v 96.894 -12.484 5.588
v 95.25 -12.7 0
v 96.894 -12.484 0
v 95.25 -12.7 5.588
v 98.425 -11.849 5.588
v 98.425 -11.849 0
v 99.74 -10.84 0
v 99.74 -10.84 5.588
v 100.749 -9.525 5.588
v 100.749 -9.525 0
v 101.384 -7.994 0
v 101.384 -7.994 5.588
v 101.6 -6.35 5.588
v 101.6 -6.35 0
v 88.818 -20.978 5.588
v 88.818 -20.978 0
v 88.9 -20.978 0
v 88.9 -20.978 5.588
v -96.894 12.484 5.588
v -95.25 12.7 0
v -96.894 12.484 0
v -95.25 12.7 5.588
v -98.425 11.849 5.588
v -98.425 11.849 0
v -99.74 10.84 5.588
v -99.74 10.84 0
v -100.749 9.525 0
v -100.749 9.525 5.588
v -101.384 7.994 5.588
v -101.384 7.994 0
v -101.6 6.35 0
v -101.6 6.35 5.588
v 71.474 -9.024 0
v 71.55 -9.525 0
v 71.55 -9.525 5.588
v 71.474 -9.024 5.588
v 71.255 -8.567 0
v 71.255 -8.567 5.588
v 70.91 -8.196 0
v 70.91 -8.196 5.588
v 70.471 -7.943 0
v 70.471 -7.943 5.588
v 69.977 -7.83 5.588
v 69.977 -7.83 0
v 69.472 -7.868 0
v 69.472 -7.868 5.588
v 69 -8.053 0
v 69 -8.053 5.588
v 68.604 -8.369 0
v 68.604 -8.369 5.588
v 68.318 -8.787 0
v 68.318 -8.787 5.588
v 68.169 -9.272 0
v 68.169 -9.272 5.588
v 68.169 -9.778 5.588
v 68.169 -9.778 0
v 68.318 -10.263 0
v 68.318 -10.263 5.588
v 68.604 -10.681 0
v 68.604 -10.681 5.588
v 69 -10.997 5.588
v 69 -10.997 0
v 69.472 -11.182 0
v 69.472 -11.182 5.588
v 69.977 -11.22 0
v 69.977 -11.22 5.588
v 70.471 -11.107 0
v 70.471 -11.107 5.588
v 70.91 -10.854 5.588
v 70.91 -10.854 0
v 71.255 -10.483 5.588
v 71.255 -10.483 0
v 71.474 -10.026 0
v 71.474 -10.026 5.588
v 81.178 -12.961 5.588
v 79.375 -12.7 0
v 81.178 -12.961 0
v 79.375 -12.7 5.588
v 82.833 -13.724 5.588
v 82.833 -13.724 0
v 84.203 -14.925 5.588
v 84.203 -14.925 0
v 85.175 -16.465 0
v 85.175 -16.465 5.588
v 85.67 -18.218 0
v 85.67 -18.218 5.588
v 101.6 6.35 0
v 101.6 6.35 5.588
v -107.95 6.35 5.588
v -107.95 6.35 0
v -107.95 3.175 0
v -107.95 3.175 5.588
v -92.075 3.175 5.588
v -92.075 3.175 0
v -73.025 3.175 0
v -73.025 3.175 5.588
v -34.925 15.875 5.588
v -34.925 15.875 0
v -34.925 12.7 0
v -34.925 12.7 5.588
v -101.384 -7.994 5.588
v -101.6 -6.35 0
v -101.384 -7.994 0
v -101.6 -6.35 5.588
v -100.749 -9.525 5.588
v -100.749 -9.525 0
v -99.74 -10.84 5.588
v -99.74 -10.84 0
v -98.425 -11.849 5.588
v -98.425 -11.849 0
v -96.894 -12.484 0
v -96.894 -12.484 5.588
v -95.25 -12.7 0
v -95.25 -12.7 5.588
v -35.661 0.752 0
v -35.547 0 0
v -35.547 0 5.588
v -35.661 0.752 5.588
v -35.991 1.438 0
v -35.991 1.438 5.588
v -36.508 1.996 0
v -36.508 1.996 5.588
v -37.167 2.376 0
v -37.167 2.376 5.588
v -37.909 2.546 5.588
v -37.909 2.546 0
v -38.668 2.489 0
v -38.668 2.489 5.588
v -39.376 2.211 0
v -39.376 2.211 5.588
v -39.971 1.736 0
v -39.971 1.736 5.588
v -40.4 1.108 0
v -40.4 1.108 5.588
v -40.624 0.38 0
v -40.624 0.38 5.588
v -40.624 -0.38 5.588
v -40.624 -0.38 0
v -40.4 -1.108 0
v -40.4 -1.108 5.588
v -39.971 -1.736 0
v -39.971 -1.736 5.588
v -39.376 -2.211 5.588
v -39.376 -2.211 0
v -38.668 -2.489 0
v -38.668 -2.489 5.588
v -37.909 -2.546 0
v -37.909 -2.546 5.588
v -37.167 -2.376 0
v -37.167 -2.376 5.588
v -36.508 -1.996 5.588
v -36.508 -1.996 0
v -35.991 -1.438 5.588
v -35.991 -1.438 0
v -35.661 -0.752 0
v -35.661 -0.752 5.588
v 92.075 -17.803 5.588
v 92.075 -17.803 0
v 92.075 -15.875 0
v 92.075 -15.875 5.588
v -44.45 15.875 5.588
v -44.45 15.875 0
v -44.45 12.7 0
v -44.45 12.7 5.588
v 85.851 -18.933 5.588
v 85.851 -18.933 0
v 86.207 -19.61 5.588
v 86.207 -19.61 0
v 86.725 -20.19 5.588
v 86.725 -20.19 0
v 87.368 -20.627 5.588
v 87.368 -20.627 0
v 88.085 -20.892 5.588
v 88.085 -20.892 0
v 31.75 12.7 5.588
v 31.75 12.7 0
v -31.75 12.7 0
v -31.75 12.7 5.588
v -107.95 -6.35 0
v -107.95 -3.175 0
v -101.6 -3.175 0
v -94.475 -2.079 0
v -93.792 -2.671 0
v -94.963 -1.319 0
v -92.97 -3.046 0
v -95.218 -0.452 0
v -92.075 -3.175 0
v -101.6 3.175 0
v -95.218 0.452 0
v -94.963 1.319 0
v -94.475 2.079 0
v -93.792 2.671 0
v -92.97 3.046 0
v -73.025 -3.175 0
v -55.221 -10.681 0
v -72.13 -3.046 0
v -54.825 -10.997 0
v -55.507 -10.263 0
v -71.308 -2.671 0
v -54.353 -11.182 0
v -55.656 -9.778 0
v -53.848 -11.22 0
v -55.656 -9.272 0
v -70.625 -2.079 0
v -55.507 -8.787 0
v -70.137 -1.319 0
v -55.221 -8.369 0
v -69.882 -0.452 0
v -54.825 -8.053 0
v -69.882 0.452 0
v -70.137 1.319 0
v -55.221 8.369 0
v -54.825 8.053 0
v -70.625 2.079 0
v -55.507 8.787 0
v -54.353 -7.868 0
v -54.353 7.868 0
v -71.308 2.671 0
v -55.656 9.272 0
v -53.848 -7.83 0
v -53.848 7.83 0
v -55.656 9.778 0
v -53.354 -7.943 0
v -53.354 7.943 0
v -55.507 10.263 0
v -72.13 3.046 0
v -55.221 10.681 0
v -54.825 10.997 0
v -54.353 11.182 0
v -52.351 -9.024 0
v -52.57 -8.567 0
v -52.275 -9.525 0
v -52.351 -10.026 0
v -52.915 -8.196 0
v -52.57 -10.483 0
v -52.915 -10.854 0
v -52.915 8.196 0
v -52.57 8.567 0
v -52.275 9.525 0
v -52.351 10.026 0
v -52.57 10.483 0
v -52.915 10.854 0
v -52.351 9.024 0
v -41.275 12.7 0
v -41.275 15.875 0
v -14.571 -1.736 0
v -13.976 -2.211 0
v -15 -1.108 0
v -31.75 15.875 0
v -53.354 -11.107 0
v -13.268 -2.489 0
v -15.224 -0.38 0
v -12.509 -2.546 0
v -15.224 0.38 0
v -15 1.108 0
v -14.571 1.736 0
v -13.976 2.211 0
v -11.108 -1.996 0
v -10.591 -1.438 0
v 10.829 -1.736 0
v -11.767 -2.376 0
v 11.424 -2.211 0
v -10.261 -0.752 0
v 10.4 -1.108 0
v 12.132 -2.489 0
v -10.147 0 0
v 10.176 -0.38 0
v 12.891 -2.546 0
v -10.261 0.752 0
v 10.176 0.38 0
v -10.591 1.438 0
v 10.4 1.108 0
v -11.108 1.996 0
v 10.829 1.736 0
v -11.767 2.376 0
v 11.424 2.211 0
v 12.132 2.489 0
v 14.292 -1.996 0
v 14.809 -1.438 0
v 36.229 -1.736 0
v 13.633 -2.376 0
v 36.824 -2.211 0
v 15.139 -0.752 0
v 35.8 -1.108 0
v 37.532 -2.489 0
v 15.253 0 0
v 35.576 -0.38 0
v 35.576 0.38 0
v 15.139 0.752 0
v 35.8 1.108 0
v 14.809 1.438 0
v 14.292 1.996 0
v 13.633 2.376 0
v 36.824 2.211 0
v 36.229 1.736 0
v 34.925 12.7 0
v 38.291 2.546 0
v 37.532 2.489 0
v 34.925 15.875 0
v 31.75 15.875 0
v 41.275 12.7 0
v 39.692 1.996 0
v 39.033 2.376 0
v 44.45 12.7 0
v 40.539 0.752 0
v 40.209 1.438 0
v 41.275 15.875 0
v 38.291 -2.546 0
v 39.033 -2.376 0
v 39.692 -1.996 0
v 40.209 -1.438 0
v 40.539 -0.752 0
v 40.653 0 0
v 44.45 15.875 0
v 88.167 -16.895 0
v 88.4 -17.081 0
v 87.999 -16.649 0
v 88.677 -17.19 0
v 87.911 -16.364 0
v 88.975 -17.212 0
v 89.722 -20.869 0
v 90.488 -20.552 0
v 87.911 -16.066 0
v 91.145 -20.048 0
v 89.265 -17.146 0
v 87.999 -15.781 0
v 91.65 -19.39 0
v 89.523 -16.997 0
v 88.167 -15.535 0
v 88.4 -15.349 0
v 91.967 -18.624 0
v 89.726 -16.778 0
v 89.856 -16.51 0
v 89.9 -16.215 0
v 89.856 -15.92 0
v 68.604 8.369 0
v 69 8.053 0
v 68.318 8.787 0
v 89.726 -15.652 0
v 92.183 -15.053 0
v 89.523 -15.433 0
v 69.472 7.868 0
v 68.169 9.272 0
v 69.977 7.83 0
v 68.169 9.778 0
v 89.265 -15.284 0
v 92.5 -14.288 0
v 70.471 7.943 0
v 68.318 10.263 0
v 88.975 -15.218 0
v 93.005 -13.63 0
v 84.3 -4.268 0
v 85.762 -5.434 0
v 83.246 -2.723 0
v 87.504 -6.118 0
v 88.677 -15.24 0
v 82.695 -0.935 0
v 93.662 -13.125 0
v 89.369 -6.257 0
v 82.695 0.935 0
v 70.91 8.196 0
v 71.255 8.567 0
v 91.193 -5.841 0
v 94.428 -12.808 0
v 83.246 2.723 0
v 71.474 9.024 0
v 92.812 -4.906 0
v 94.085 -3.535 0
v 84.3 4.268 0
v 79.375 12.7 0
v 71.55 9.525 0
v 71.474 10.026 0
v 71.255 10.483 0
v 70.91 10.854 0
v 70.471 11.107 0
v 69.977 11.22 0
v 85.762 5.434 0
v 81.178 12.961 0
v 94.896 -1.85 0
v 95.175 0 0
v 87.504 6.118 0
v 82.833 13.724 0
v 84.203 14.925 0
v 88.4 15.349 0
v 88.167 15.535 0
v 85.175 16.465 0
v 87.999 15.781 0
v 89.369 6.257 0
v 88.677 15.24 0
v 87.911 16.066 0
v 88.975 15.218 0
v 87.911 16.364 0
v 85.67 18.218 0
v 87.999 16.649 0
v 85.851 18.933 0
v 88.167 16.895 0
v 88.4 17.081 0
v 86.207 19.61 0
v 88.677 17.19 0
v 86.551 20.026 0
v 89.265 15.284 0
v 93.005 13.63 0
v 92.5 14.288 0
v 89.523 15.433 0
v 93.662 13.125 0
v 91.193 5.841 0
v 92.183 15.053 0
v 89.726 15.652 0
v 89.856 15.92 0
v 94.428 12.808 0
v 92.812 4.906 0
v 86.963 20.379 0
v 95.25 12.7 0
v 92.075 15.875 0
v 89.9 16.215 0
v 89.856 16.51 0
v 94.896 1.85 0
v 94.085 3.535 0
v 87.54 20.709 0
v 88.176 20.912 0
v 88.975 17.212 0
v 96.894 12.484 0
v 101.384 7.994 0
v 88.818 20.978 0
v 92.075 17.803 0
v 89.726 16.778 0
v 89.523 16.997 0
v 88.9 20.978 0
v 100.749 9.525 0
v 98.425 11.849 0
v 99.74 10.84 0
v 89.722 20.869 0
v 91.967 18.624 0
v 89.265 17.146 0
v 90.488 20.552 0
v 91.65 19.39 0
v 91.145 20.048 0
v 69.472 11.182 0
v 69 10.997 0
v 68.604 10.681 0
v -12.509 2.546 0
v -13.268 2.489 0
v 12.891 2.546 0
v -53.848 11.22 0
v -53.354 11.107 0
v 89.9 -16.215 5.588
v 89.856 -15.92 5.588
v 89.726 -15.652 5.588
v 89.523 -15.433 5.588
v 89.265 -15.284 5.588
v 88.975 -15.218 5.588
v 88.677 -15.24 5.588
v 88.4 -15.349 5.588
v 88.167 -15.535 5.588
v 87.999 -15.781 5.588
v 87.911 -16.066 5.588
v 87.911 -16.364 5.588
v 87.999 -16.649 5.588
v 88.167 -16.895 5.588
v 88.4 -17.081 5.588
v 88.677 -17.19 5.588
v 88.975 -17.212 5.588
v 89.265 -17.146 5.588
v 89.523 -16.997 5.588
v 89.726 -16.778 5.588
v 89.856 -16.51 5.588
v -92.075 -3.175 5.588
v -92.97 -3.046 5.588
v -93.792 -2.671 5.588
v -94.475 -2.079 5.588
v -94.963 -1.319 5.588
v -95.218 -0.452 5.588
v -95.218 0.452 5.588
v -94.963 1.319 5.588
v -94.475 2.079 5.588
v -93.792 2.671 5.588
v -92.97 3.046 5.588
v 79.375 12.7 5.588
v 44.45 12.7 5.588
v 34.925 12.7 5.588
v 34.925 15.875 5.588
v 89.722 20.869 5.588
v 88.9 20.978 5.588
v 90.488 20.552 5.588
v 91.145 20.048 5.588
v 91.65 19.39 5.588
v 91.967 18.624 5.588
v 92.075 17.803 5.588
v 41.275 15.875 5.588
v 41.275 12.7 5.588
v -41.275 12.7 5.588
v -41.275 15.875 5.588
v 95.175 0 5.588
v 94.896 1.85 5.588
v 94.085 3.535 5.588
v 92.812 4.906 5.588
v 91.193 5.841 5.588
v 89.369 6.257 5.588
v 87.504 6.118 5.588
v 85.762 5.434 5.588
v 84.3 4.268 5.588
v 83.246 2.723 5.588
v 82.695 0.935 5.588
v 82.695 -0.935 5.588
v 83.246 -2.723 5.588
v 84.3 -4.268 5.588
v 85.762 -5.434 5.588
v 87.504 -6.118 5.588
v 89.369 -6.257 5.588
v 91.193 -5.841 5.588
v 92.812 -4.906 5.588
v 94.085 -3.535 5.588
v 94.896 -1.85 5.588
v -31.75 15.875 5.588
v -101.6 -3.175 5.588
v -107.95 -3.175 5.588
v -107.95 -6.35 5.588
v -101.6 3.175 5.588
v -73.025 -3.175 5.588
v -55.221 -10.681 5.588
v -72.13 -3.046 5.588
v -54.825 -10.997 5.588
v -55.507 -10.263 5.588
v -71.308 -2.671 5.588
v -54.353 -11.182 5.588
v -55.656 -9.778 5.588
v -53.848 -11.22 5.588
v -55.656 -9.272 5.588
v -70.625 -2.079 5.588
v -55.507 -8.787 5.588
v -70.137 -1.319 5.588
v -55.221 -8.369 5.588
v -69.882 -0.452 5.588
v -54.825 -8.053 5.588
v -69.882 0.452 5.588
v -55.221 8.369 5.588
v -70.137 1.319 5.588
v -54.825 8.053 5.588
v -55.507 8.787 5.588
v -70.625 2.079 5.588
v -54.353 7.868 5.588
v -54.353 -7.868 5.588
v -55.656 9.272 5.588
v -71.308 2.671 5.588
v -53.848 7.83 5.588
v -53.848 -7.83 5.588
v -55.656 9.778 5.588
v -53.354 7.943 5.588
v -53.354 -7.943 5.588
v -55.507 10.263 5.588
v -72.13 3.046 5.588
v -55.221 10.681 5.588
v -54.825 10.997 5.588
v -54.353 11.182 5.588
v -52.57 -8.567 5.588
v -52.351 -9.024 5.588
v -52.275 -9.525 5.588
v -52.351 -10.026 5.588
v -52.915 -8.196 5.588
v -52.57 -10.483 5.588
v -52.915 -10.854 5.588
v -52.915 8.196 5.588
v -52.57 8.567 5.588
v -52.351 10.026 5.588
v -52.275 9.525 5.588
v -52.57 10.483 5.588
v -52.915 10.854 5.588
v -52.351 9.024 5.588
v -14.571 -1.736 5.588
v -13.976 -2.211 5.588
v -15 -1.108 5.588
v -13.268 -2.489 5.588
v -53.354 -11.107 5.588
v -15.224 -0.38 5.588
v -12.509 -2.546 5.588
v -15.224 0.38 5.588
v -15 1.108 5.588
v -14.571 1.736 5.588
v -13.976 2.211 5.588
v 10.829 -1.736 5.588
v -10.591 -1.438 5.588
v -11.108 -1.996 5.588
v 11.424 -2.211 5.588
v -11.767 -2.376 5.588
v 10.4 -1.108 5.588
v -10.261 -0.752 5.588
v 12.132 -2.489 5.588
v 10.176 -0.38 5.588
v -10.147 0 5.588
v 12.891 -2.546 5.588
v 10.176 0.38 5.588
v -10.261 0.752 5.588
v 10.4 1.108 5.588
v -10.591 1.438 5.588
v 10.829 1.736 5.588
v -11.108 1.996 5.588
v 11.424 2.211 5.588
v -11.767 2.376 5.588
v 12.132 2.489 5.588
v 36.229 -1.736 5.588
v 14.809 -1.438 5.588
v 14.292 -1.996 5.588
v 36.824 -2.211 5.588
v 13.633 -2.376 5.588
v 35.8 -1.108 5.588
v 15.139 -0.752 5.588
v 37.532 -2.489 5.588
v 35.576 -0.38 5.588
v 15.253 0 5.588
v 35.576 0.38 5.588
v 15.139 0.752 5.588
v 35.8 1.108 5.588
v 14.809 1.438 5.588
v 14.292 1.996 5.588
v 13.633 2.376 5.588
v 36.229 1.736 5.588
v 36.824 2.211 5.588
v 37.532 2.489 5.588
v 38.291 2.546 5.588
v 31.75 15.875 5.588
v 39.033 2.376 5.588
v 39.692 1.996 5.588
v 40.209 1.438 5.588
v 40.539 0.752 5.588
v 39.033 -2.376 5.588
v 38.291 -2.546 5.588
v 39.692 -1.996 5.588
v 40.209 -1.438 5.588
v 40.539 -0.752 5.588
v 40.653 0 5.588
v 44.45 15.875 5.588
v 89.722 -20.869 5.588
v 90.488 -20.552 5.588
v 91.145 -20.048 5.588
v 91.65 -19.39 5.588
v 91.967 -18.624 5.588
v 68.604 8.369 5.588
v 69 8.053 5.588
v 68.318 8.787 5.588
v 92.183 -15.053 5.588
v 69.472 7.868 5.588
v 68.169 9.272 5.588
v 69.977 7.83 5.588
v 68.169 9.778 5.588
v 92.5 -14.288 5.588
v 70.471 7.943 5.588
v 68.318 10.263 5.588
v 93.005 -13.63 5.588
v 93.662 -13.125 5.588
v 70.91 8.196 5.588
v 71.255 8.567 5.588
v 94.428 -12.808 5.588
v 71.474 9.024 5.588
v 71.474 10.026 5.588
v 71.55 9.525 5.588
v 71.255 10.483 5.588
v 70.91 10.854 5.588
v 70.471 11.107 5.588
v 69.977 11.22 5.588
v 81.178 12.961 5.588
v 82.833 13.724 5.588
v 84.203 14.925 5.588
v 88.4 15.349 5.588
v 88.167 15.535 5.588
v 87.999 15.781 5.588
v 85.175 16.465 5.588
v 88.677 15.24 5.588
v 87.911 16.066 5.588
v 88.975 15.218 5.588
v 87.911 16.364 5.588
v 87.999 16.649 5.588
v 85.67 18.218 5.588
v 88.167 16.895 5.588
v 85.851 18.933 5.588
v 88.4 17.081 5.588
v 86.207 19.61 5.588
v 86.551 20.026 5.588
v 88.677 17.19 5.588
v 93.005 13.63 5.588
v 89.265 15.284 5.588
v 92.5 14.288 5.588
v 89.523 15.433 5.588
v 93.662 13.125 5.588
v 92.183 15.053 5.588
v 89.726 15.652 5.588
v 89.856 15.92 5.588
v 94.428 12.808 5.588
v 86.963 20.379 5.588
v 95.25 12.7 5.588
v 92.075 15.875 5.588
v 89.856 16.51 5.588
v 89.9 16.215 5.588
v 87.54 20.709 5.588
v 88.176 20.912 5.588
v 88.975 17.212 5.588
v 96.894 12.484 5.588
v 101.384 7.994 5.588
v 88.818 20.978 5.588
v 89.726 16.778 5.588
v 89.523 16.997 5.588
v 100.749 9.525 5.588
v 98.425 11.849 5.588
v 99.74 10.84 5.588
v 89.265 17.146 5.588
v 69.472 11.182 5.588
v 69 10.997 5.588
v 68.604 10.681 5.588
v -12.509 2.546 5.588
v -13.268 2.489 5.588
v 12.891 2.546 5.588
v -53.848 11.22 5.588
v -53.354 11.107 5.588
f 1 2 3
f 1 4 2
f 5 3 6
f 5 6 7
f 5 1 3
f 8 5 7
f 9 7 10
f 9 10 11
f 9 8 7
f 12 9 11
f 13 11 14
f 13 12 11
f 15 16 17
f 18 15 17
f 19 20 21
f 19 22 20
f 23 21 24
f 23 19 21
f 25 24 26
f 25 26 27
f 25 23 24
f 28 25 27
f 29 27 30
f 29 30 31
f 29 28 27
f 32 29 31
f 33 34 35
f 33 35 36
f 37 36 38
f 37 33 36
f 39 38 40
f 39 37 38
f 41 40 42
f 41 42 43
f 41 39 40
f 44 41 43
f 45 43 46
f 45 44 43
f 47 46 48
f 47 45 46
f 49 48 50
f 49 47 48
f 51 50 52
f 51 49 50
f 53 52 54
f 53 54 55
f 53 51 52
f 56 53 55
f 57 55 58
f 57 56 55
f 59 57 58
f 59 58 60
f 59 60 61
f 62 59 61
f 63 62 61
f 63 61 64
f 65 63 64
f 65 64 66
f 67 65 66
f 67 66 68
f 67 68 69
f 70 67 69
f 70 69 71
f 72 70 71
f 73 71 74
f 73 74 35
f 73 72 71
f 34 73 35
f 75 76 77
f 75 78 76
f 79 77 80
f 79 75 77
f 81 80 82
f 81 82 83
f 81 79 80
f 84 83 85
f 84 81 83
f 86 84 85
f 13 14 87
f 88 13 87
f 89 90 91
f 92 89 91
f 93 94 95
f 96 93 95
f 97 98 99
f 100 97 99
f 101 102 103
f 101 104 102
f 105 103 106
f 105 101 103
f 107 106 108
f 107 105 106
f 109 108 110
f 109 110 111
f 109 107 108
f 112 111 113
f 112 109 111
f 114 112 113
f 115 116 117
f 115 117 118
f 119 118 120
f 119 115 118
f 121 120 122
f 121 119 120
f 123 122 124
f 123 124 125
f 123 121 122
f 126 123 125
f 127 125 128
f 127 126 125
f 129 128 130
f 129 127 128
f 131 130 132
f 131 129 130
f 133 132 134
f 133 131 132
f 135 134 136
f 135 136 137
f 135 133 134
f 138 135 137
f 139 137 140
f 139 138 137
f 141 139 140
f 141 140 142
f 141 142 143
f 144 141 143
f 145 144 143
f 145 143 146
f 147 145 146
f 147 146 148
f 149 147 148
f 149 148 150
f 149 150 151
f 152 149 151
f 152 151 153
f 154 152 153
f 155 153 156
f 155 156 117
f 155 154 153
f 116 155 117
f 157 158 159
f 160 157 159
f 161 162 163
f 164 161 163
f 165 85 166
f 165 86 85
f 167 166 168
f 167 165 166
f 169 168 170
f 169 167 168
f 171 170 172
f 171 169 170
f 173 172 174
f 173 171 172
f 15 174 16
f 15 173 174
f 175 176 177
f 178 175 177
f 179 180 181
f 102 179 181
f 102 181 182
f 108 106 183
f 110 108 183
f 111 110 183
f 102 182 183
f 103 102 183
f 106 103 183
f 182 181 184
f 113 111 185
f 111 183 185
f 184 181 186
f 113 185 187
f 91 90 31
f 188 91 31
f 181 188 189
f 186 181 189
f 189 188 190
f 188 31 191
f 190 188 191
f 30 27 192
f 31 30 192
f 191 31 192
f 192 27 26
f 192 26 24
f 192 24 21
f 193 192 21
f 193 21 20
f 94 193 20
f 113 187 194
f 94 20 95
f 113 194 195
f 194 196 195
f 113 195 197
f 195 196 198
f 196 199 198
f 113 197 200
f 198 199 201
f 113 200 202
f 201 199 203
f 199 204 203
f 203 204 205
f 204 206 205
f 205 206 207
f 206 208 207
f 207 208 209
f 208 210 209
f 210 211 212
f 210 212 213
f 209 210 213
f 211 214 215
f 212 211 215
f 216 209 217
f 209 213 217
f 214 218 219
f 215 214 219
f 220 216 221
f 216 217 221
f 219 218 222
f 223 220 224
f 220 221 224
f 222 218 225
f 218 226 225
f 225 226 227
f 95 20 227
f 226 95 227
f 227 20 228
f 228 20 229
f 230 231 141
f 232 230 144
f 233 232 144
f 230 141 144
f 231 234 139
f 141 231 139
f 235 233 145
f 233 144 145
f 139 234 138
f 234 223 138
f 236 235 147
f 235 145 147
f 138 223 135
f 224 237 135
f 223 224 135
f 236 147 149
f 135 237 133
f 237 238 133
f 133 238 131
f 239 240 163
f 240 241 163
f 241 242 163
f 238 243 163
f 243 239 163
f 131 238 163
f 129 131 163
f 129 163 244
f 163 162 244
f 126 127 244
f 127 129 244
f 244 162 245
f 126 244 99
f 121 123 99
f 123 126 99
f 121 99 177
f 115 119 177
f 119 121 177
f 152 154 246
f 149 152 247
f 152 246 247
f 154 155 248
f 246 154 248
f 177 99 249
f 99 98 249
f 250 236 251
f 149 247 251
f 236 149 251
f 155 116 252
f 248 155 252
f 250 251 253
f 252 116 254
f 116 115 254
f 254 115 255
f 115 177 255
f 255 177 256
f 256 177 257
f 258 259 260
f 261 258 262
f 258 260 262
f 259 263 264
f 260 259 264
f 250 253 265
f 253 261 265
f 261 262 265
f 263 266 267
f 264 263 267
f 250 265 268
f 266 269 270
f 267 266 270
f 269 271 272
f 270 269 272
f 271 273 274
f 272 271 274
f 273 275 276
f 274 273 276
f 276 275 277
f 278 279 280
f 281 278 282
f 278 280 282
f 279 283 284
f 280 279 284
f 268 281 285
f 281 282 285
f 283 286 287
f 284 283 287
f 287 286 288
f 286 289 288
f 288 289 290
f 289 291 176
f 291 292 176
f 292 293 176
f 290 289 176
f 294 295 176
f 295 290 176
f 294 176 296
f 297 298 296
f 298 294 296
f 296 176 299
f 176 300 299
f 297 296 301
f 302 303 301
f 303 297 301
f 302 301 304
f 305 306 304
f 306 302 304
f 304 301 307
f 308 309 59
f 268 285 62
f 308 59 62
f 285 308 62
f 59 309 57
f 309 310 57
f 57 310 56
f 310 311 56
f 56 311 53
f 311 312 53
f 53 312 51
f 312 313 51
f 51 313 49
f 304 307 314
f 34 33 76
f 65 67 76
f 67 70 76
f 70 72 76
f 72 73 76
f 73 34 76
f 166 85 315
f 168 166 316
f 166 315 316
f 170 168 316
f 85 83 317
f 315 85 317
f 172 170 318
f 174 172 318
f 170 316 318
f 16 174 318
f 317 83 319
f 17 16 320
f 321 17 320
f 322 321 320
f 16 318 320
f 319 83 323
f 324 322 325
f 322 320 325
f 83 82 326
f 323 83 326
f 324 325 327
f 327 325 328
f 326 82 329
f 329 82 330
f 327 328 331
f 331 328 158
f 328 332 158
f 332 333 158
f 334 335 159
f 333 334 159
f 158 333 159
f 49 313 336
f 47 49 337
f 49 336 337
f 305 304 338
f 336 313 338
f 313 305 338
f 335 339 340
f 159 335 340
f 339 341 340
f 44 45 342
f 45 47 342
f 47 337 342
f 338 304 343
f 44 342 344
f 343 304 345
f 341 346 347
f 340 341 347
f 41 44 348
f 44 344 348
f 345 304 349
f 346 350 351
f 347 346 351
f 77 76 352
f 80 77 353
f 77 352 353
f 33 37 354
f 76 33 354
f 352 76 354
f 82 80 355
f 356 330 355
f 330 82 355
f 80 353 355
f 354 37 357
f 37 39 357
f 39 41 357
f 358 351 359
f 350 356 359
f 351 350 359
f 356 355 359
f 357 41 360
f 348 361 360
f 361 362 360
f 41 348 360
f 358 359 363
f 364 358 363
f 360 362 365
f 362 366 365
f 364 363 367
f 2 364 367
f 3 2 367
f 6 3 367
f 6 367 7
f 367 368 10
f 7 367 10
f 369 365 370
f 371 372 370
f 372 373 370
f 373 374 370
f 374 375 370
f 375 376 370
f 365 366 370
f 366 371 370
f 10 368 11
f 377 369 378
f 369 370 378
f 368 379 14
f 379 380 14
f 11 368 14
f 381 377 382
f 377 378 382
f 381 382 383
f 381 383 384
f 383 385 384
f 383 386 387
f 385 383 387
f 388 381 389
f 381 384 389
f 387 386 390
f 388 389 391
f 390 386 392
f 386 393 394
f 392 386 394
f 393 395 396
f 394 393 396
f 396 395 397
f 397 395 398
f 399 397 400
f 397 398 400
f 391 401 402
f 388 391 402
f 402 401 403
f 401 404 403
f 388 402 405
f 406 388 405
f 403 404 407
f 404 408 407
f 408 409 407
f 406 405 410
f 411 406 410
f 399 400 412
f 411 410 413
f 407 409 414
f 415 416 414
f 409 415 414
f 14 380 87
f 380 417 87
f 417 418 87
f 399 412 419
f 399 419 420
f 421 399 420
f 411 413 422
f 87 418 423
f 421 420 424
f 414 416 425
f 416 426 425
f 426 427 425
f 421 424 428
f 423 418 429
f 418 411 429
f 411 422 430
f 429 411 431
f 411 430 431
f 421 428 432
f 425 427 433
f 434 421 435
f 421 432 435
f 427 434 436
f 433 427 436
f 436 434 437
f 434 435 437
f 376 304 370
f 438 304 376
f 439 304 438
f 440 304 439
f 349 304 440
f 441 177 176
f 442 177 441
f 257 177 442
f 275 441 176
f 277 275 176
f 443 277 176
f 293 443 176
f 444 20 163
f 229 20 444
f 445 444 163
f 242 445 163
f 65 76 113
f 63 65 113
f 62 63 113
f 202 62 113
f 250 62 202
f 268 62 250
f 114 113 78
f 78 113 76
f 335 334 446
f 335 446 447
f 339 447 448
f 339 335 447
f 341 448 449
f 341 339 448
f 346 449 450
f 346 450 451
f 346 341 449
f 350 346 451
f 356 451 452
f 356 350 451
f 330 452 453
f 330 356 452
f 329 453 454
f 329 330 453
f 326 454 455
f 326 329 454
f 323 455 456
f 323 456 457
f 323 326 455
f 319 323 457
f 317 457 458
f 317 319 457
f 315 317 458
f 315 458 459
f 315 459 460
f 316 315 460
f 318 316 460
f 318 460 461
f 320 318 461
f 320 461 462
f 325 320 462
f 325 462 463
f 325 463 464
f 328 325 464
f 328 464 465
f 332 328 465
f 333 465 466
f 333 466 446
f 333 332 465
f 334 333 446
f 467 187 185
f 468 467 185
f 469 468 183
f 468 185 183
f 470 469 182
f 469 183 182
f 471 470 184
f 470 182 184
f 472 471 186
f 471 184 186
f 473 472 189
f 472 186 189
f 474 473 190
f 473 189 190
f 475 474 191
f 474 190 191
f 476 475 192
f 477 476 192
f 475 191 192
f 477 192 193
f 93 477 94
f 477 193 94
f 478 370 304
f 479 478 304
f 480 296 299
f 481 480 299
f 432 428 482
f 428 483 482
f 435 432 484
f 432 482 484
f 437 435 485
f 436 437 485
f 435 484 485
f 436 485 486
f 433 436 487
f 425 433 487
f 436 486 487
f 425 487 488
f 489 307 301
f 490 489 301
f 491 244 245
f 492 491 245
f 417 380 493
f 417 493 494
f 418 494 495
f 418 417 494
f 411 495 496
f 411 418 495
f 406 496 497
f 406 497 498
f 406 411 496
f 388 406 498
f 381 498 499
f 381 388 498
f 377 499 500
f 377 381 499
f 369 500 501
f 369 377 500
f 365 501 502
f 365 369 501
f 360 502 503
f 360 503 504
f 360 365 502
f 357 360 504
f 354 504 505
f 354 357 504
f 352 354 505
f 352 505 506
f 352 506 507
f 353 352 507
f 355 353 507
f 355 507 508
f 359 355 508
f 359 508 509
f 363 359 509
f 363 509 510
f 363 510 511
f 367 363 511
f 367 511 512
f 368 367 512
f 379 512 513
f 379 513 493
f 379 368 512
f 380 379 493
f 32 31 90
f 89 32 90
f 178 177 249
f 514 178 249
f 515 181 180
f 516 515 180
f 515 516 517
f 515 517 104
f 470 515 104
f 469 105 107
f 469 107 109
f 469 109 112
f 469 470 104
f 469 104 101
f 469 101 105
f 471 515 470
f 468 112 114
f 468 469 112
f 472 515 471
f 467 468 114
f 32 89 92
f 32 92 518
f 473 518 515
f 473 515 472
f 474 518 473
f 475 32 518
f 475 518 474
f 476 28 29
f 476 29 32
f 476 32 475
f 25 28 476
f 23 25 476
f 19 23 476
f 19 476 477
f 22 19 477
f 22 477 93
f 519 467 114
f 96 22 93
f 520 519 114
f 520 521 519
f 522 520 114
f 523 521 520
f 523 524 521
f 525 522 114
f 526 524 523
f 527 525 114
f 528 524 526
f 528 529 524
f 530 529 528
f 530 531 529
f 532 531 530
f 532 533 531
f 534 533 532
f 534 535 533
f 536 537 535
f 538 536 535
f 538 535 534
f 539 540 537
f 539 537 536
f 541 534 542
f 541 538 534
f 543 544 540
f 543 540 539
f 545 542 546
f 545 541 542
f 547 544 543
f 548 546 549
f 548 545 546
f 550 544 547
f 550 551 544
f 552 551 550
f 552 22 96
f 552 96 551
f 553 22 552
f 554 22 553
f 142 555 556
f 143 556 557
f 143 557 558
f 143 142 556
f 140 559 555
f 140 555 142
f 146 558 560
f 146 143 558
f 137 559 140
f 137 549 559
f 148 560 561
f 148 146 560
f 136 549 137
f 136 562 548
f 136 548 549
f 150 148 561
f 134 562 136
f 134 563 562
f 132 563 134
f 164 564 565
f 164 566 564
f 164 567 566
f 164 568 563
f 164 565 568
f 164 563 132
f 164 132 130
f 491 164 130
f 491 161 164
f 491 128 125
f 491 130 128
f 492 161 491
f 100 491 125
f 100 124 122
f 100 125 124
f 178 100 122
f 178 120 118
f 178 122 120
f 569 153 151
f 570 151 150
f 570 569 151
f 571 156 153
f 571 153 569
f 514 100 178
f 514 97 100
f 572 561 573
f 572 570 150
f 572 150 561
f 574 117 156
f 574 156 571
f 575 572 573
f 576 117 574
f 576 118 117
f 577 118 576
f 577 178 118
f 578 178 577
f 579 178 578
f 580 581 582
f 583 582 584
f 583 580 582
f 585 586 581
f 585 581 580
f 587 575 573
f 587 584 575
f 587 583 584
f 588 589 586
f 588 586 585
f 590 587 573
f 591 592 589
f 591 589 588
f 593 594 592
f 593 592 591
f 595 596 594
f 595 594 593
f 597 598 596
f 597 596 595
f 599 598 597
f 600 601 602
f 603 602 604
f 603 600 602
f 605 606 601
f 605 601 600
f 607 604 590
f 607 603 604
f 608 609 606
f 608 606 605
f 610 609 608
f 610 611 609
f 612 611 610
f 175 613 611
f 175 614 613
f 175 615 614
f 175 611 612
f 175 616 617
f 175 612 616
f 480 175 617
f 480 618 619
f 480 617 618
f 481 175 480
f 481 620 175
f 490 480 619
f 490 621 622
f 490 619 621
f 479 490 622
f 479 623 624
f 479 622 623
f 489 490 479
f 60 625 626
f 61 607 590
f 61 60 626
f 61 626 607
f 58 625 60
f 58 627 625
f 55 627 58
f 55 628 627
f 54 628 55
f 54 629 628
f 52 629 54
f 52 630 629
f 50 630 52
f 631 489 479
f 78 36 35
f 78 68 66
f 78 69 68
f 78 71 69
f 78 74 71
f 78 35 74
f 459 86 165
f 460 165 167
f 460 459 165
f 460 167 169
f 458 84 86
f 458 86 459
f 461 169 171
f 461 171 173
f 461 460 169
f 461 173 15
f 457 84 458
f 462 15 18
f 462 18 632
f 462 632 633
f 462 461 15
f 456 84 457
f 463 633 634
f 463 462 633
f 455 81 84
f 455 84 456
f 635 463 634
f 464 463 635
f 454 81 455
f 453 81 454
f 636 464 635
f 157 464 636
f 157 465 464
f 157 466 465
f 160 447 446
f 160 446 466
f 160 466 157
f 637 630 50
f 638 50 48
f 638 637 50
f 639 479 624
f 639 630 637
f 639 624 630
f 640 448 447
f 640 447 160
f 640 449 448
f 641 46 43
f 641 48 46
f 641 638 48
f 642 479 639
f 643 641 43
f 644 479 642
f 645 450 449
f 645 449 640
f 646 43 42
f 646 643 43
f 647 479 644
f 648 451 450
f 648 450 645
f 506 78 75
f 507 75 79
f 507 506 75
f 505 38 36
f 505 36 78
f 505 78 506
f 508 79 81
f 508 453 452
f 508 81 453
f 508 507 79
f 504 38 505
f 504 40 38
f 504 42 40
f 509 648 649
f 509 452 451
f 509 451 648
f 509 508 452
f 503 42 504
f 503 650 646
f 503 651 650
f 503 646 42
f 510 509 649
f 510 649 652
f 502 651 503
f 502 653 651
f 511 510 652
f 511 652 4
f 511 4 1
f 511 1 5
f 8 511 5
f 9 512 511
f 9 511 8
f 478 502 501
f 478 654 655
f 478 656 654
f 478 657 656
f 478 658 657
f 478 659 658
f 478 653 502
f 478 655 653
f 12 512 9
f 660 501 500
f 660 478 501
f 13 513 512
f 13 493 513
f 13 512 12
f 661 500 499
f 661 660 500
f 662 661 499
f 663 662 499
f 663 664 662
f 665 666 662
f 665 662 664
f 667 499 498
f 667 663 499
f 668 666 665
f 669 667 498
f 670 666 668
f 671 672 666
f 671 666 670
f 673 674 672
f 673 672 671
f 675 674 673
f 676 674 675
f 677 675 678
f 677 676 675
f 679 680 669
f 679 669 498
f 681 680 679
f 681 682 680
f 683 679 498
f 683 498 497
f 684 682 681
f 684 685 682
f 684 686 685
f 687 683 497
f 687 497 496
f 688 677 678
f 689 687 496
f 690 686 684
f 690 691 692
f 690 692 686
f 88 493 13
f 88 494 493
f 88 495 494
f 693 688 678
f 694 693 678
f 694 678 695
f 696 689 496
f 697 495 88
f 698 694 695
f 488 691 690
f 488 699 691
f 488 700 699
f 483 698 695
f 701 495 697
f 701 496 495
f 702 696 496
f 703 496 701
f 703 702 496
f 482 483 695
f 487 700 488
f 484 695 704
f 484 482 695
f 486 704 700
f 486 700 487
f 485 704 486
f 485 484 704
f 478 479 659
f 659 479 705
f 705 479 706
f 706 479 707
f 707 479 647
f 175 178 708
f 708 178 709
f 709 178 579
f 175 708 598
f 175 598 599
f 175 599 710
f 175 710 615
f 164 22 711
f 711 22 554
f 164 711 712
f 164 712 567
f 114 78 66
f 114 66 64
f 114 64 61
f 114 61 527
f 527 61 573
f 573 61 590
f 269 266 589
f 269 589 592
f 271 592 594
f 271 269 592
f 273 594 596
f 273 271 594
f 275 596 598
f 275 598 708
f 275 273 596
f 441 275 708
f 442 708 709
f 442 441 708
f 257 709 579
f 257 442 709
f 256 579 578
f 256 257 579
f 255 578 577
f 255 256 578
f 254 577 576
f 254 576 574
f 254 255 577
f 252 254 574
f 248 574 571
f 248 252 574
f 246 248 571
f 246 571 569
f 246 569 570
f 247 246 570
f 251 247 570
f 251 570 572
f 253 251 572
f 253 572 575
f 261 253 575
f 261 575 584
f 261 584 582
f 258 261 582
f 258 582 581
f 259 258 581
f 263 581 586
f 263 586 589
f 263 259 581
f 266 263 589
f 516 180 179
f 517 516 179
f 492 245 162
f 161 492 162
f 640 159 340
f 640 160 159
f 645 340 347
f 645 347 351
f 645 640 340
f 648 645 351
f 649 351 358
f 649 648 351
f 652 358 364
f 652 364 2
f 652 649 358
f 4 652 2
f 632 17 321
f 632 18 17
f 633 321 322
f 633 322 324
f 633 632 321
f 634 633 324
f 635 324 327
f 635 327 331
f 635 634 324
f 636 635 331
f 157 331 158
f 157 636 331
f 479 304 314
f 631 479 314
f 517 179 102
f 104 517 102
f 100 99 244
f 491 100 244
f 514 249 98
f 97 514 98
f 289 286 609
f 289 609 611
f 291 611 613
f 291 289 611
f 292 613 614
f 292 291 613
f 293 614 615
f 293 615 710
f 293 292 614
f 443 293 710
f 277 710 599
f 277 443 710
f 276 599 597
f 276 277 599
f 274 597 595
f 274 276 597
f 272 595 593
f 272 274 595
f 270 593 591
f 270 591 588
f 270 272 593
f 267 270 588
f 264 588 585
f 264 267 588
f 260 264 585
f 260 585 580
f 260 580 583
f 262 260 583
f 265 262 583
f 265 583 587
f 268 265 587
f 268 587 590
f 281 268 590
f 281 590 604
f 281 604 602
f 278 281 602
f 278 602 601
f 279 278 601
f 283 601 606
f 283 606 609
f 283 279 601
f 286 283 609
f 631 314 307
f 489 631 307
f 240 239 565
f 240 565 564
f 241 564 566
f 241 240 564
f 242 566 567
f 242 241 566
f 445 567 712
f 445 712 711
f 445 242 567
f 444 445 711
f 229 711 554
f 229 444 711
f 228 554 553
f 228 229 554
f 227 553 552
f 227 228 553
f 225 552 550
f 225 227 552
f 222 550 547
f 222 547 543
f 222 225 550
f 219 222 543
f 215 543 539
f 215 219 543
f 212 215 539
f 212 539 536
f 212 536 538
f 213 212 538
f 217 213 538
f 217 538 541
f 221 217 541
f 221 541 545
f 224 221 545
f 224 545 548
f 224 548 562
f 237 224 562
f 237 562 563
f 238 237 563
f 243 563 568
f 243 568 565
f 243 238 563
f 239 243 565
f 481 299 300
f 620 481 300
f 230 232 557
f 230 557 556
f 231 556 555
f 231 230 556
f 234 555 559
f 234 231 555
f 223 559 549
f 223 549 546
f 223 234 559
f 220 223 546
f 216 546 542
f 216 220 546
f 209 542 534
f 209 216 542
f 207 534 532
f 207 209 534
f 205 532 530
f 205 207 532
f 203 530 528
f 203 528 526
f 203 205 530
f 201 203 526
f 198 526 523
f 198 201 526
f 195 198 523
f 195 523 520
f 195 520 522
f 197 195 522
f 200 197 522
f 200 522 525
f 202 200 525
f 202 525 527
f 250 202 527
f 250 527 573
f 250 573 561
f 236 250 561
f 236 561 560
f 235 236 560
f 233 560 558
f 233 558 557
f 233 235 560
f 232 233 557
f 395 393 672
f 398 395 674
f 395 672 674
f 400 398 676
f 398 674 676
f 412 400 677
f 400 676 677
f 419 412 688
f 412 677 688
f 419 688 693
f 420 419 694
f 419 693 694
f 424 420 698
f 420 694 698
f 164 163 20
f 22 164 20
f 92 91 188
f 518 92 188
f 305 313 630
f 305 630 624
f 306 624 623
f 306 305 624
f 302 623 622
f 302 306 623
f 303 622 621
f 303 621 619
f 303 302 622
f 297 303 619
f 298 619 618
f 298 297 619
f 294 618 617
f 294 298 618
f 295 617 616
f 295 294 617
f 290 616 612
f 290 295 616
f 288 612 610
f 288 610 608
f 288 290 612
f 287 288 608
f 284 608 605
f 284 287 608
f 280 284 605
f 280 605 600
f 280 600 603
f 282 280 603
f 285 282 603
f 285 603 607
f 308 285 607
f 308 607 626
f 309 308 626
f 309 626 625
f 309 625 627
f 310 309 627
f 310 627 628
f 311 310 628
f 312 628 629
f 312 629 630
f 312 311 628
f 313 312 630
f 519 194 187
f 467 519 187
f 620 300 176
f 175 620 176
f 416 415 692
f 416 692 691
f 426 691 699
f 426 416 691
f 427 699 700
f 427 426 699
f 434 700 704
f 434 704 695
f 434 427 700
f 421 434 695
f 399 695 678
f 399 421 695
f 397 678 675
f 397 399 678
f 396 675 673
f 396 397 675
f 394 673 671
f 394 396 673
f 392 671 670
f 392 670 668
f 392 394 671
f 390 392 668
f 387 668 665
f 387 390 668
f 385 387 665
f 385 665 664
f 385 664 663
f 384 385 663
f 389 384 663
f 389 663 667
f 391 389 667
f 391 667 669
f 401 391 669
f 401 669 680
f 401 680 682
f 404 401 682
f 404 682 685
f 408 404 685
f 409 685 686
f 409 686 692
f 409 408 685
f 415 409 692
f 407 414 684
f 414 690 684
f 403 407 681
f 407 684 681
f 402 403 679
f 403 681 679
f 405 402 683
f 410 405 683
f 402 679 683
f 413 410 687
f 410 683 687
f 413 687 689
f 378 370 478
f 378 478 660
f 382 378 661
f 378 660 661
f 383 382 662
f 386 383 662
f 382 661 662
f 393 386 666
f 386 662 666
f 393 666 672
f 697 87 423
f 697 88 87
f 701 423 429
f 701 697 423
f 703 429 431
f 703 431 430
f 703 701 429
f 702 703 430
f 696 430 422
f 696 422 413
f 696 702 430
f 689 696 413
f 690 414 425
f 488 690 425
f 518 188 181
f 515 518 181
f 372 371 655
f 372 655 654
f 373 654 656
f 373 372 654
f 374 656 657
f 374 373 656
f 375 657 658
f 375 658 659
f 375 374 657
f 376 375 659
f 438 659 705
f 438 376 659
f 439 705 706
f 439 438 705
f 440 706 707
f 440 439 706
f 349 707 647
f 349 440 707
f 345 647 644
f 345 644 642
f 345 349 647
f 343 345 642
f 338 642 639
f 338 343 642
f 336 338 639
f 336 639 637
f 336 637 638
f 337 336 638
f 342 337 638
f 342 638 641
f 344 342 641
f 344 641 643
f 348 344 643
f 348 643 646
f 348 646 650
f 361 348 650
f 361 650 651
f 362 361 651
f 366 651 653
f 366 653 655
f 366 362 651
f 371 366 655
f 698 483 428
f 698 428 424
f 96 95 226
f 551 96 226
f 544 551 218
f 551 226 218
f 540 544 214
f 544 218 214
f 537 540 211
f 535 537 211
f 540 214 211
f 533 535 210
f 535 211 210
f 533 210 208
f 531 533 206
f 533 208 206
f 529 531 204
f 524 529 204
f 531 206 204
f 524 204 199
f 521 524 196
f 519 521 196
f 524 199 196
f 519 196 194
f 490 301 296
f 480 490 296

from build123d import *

# Parameters (mm, degrees)
SKETCH2_R           = 1.7
SKETCH2_R_2         = 2.5527
SKETCH2_R_3         = 1
SKETCH2_R_4         = 6.275
BOSS_EXTRUDE1_DEPTH = 5.588
FILLET1_R           = 6.35
FILLET2_R           = 3.175


with BuildPart() as part:
    # Sketch2 → Boss-Extrude1 (new body)
    with BuildSketch(Plane.XY):
        Polygon((-44.45, 12.7), (-101.6, 12.7), (-101.6, 6.35), (-107.95, 6.35), (-107.95, 3.175), (-101.6, 3.175), (-101.6, -3.175), (-107.95, -3.175), (-107.95, -6.35), (-101.6, -6.35), (-101.6, -12.7), (85.725, -12.7), (85.725, -20.9775), (92.075, -20.9775), (92.075, -12.7), (101.6, -12.7), (101.6, 12.7), (92.075, 12.7), (92.075, 20.9775), (85.725, 20.9775), (85.725, 12.7), (44.45, 12.7), (44.45, 15.875), (41.275, 15.875), (41.275, 12.7), (34.925, 12.7), (34.925, 15.875), (31.75, 15.875), (31.75, 12.7), (-31.75, 12.7), (-31.75, 15.875), (-34.925, 15.875), (-34.925, 12.7), (-41.275, 12.7), (-41.275, 15.875), (-44.45, 15.875), align=None)
        with BuildLine():
            ThreePointArc((-92.075, -3.175), (-95.25, 0), (-92.075, 3.175))
            Line((-92.075, 3.175), (-73.025, 3.175))
            ThreePointArc((-73.025, 3.175), (-69.85, 0), (-73.025, -3.175))
            Line((-73.025, -3.175), (-92.075, -3.175))
        make_face(mode=Mode.SUBTRACT)
        with Locations((-53.975, -9.525)):
            Circle(SKETCH2_R, mode=Mode.SUBTRACT)
        with Locations((-38.1, 0)):
            Circle(SKETCH2_R_2, mode=Mode.SUBTRACT)
        with Locations((-12.7, 0)):
            Circle(SKETCH2_R_2, mode=Mode.SUBTRACT)
        with Locations((88.9, -16.215)):
            Circle(SKETCH2_R_3, mode=Mode.SUBTRACT)
        with Locations((12.7, 0)):
            Circle(SKETCH2_R_2, mode=Mode.SUBTRACT)
        with Locations((38.1, 0)):
            Circle(SKETCH2_R_2, mode=Mode.SUBTRACT)
        with Locations((69.85, -9.525)):
            Circle(SKETCH2_R, mode=Mode.SUBTRACT)
        with Locations((88.9, 0)):
            Circle(SKETCH2_R_4, mode=Mode.SUBTRACT)
        with Locations((-53.975, 9.525)):
            Circle(SKETCH2_R, mode=Mode.SUBTRACT)
        with Locations((69.85, 9.525)):
            Circle(SKETCH2_R, mode=Mode.SUBTRACT)
        with Locations((88.9, 16.215)):
            Circle(SKETCH2_R_3, mode=Mode.SUBTRACT)
    extrude(amount=BOSS_EXTRUDE1_DEPTH)

    # Fillet1
    fillet1_edges = [part.edges().sort_by_distance(p)[0] for p in [
        (101.6, -12.7, 2.794),
        (101.6, 12.7, 2.794),
        (-101.6, -12.7, 2.794),
        (-101.6, 12.7, 2.794),
        (85.725, -12.7, 2.794),
        (85.725, 12.7, 2.794),
    ]]
    fillet(fillet1_edges, radius=FILLET1_R - 0.0001)  # a hair under: the kernel refuses the full size

    # Fillet2
    fillet2_edges = [part.edges().sort_by_distance(p)[0] for p in [
        (85.725, -20.9775, 2.794),
        (92.075, -20.9775, 2.794),
        (92.075, -12.7, 2.794),
        (92.075, 12.7, 2.794),
        (92.075, 20.9775, 2.794),
        (85.725, 20.9775, 2.794),
    ]]
    fillet(fillet2_edges, radius=FILLET2_R)


solid = part.part
